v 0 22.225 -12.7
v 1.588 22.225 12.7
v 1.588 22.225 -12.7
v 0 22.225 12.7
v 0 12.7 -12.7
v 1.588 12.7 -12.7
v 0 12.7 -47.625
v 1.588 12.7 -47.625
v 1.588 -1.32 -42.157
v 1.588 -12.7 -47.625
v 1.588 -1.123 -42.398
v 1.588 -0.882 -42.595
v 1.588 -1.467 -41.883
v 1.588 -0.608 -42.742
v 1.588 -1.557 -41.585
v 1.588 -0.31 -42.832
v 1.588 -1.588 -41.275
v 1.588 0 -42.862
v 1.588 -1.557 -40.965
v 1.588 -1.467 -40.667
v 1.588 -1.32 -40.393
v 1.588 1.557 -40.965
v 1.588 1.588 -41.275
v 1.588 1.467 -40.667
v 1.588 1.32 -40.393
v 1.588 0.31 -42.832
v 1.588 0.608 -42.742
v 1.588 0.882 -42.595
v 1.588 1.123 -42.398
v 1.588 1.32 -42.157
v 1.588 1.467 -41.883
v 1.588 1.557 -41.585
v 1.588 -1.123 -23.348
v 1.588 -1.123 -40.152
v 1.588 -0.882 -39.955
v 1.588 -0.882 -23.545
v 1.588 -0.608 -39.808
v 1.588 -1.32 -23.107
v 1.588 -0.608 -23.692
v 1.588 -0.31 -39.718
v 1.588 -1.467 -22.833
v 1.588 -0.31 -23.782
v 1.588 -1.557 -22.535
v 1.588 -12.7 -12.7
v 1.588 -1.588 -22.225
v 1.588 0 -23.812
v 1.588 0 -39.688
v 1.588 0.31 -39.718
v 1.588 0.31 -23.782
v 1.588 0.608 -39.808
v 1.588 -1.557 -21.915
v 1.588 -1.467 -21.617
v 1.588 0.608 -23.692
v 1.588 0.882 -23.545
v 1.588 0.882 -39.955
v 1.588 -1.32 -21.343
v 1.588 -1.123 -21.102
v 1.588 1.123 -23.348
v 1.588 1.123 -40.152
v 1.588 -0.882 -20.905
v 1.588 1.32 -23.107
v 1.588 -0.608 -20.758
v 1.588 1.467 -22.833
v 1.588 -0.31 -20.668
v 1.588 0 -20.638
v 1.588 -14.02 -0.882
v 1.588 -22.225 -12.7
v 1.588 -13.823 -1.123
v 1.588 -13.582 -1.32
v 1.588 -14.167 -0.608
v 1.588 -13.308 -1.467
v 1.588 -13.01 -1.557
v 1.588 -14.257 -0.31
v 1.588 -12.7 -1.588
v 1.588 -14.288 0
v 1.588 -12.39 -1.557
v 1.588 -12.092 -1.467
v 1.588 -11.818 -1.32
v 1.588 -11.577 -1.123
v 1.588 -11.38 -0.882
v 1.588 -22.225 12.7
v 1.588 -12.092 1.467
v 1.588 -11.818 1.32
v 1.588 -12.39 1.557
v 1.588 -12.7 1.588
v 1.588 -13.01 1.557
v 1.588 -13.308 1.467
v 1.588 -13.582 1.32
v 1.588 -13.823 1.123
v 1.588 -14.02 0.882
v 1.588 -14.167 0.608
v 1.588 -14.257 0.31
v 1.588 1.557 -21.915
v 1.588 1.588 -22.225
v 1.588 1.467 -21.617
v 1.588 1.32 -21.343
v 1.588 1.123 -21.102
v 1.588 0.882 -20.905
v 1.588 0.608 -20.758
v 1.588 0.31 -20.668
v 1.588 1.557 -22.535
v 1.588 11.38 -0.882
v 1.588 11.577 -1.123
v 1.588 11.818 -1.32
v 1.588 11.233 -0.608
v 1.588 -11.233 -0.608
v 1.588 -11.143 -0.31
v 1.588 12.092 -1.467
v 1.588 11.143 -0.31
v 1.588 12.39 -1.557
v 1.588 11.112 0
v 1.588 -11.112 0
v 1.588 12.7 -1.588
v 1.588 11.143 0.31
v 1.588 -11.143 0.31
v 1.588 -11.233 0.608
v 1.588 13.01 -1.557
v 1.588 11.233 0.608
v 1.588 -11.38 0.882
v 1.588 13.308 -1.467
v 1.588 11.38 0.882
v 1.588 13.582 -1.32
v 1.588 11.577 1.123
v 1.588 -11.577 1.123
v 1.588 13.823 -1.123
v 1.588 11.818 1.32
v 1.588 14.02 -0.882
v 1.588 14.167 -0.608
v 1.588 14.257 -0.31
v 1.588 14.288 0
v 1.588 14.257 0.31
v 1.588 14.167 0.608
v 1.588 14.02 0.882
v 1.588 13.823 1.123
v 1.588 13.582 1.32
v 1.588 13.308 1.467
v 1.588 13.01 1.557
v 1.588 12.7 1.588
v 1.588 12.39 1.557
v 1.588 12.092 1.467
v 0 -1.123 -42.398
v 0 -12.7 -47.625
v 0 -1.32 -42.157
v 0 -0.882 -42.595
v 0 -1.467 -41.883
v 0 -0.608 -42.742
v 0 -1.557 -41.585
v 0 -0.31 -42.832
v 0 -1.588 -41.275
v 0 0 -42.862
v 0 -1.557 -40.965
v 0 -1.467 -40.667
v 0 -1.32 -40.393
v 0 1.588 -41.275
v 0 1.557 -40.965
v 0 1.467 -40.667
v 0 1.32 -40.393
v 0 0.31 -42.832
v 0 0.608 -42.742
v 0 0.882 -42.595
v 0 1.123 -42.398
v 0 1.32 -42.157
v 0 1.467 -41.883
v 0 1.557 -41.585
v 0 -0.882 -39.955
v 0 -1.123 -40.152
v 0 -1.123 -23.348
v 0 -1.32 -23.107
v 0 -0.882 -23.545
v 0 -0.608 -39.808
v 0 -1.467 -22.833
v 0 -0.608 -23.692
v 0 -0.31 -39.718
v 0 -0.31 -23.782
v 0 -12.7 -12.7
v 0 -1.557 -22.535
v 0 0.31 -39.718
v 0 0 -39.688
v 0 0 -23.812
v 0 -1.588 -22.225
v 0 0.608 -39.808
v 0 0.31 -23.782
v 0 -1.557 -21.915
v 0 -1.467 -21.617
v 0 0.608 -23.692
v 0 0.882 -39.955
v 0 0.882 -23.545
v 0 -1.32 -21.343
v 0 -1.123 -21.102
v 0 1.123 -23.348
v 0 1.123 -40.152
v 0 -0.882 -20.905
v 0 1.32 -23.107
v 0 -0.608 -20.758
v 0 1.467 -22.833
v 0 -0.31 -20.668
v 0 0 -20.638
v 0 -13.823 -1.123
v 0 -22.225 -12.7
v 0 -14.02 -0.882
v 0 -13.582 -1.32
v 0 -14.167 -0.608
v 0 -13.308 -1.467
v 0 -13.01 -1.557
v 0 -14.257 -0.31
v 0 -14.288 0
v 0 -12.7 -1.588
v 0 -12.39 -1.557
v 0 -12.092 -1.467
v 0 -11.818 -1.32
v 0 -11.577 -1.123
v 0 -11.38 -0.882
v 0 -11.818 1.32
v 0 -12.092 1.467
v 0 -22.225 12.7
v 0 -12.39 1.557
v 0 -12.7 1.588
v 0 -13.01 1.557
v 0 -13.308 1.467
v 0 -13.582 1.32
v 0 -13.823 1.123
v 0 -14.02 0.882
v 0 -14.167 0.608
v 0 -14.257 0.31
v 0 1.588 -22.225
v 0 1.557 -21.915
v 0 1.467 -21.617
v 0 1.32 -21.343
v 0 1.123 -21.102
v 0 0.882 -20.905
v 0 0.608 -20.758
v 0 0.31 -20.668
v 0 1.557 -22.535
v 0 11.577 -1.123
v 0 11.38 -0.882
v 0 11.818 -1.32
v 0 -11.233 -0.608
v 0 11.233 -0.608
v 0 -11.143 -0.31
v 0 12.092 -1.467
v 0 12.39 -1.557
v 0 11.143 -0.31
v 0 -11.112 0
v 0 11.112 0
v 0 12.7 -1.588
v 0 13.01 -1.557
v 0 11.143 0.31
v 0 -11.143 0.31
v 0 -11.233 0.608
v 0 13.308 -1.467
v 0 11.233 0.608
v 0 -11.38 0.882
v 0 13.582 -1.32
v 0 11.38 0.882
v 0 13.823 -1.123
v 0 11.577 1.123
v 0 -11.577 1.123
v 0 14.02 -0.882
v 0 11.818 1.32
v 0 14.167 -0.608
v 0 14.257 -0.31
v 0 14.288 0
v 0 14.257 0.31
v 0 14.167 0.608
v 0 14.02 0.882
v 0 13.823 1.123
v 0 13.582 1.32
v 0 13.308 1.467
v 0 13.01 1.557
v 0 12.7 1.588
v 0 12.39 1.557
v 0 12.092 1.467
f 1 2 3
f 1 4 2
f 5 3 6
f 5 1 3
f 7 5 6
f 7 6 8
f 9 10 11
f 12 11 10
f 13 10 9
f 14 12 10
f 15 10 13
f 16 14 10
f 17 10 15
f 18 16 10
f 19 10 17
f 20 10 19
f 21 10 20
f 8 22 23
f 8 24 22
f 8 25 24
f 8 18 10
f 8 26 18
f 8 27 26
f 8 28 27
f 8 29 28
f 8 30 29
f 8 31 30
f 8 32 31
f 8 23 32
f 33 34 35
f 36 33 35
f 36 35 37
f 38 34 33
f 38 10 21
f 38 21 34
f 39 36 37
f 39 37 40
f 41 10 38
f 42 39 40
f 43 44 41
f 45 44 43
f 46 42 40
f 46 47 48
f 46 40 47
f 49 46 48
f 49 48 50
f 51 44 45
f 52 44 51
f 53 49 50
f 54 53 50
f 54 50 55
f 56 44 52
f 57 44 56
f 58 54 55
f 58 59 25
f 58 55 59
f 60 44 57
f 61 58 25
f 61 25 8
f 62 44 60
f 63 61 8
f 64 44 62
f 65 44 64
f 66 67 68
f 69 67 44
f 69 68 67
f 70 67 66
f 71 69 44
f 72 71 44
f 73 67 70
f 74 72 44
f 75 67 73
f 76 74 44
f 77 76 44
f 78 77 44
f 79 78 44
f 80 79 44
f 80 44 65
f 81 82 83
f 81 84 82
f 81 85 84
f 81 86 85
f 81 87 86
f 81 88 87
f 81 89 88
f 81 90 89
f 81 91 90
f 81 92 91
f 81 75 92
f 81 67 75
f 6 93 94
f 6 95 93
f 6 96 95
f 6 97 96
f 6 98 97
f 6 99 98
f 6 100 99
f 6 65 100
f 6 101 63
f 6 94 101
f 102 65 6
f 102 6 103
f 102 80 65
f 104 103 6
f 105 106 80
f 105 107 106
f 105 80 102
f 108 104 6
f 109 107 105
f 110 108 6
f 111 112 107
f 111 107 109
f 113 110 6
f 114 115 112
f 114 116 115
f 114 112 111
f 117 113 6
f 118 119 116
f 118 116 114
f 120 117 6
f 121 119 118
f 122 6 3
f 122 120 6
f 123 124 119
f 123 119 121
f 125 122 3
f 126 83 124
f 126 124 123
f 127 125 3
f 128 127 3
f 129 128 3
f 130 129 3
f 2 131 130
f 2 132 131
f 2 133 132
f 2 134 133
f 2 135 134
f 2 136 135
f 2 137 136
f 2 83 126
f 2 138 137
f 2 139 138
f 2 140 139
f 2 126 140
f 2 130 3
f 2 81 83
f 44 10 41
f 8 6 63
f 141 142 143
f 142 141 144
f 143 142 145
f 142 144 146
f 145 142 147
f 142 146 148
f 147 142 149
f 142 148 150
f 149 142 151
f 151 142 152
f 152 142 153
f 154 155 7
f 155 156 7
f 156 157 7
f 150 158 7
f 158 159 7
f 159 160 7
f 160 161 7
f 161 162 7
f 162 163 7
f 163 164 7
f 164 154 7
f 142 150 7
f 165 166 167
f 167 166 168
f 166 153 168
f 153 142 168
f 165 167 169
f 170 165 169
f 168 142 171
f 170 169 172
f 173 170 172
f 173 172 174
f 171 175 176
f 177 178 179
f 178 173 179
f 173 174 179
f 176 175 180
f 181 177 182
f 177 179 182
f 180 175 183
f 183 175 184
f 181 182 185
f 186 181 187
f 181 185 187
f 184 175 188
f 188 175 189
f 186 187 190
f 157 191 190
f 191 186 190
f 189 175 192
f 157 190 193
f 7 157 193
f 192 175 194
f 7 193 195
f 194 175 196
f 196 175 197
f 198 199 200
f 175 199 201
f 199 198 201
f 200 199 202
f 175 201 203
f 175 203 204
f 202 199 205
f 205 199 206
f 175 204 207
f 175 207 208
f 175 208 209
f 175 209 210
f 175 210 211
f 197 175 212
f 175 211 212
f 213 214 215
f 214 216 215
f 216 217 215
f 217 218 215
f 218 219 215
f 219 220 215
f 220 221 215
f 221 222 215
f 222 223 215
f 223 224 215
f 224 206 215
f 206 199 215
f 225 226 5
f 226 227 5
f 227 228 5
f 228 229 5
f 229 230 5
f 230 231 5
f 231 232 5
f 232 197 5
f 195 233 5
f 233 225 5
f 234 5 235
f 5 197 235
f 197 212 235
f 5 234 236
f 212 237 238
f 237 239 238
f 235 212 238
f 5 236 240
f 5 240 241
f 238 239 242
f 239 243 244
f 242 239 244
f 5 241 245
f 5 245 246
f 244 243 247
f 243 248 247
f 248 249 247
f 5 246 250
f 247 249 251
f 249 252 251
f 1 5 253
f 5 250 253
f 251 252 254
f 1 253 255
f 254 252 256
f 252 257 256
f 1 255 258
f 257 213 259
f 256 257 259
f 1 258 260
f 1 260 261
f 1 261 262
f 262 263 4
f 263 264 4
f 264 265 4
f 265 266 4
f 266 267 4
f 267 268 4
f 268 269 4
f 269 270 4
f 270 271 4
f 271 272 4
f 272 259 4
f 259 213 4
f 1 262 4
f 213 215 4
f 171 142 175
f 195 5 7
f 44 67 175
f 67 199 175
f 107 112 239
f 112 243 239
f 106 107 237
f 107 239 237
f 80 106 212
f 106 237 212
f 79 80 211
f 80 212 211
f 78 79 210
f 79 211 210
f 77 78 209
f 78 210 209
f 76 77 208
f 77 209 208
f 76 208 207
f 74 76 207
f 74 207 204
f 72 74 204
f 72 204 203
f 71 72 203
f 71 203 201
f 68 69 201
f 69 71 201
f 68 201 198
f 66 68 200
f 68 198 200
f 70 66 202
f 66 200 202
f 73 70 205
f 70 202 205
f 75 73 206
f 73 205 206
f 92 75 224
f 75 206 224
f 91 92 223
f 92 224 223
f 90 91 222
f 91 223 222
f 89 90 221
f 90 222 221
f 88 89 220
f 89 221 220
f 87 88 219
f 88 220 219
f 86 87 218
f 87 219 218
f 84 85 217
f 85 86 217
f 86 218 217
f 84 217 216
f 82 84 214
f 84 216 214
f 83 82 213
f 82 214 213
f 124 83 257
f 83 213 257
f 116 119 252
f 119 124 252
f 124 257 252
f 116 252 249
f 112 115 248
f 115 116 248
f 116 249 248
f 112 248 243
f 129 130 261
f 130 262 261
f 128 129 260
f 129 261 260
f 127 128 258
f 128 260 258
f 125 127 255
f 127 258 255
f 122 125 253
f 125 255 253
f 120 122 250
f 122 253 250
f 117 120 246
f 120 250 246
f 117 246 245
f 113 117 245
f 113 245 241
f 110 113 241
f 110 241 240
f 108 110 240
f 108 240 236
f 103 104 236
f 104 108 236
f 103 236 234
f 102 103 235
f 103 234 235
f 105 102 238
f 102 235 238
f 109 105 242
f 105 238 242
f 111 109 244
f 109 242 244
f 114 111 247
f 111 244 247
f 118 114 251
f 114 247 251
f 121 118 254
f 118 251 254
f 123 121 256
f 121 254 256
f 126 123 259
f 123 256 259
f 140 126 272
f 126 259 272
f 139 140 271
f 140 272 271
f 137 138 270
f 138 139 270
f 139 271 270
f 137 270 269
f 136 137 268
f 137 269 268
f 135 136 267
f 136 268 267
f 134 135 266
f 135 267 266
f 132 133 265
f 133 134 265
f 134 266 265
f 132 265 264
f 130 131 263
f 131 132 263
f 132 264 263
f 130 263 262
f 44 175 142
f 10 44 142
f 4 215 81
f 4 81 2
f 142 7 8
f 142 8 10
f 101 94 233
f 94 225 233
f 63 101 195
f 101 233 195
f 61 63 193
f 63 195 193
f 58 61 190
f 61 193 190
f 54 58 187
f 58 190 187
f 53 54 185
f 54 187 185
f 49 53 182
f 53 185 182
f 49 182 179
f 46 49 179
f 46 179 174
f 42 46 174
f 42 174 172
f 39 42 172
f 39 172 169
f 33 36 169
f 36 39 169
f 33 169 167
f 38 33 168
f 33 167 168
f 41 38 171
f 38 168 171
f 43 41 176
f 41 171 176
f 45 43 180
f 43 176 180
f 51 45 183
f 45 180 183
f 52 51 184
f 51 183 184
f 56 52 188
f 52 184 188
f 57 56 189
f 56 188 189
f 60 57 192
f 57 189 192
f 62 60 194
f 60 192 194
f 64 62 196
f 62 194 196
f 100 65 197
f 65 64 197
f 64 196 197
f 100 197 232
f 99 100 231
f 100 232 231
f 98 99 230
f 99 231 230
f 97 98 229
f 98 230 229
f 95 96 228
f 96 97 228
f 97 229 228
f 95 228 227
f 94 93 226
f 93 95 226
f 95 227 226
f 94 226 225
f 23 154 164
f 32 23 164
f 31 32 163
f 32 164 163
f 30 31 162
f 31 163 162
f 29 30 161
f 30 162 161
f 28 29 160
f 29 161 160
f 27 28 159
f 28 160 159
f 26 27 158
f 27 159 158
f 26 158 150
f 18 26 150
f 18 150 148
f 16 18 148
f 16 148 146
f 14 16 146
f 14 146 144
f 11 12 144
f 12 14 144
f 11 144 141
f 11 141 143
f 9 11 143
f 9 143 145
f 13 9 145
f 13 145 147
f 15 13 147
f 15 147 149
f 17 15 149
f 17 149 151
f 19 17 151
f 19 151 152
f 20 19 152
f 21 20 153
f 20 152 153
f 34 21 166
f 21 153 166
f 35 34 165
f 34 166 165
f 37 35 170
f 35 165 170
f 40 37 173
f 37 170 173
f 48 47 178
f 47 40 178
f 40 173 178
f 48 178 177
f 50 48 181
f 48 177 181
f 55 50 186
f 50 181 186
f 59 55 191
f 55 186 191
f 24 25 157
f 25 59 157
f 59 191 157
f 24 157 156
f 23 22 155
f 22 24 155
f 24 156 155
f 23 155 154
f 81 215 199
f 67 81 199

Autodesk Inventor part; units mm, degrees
ref_plane "YZ Plane" through (0, 0, 0) normal (1, 0, 0) x (0, 1, 0)
ref_plane "XZ Plane" through (0, 0, 0) normal (0, 1, 0) x (-1, 0, 0)
ref_plane "XY Plane" through (0, 0, 0) normal (0, 0, 1) x (1, 0, 0)
sketch "Sketch1" plane through (0, 0, 0) normal (1, 0, 0) x (0, 1, 0)
  line L0 (0, 0) -> (0, -41.275) construction
  circle A0 centre (0, -22.225) radius 1.5875
  circle A1 centre (0, -41.275) radius 1.5875
  line L1 (22.225, 12.7) -> (22.225, -12.7)
  line L2 (22.225, -12.7) -> (12.7, -12.7)
  line L3 (12.7, -12.7) -> (12.7, -47.625)
  line L4 (12.7, -47.625) -> (-12.7, -47.625)
  line L5 (-22.225, 12.7) -> (22.225, 12.7)
  line L6 (0, -41.275) -> (0, -47.625) construction
  line L7 (12.7, 0) -> (-12.7, 0) construction
  circle A2 centre (12.7, 0) radius 1.5875
  circle A3 centre (-12.7, 0) radius 1.5875
  line L8 (-22.225, 12.7) -> (-22.225, -12.7)
  line L9 (-22.225, -12.7) -> (-12.7, -12.7)
  line L10 (-12.7, -12.7) -> (-12.7, -47.625)
  dimension "d2" = 22.225
  dimension "d3" = 19.05
  dimension "d4" = 25.4
  dimension "d5" = 6.35
  dimension "d9" = 3.175
  dimension "d10" = 25.4
  dimension "d11" = 9.525
  dimension "d12" = 12.7
extrude "Extrusion1" add sketch "Sketch1" along normal blind 1.5875
properties part number "L Plate" material "Aluminum 6061"
